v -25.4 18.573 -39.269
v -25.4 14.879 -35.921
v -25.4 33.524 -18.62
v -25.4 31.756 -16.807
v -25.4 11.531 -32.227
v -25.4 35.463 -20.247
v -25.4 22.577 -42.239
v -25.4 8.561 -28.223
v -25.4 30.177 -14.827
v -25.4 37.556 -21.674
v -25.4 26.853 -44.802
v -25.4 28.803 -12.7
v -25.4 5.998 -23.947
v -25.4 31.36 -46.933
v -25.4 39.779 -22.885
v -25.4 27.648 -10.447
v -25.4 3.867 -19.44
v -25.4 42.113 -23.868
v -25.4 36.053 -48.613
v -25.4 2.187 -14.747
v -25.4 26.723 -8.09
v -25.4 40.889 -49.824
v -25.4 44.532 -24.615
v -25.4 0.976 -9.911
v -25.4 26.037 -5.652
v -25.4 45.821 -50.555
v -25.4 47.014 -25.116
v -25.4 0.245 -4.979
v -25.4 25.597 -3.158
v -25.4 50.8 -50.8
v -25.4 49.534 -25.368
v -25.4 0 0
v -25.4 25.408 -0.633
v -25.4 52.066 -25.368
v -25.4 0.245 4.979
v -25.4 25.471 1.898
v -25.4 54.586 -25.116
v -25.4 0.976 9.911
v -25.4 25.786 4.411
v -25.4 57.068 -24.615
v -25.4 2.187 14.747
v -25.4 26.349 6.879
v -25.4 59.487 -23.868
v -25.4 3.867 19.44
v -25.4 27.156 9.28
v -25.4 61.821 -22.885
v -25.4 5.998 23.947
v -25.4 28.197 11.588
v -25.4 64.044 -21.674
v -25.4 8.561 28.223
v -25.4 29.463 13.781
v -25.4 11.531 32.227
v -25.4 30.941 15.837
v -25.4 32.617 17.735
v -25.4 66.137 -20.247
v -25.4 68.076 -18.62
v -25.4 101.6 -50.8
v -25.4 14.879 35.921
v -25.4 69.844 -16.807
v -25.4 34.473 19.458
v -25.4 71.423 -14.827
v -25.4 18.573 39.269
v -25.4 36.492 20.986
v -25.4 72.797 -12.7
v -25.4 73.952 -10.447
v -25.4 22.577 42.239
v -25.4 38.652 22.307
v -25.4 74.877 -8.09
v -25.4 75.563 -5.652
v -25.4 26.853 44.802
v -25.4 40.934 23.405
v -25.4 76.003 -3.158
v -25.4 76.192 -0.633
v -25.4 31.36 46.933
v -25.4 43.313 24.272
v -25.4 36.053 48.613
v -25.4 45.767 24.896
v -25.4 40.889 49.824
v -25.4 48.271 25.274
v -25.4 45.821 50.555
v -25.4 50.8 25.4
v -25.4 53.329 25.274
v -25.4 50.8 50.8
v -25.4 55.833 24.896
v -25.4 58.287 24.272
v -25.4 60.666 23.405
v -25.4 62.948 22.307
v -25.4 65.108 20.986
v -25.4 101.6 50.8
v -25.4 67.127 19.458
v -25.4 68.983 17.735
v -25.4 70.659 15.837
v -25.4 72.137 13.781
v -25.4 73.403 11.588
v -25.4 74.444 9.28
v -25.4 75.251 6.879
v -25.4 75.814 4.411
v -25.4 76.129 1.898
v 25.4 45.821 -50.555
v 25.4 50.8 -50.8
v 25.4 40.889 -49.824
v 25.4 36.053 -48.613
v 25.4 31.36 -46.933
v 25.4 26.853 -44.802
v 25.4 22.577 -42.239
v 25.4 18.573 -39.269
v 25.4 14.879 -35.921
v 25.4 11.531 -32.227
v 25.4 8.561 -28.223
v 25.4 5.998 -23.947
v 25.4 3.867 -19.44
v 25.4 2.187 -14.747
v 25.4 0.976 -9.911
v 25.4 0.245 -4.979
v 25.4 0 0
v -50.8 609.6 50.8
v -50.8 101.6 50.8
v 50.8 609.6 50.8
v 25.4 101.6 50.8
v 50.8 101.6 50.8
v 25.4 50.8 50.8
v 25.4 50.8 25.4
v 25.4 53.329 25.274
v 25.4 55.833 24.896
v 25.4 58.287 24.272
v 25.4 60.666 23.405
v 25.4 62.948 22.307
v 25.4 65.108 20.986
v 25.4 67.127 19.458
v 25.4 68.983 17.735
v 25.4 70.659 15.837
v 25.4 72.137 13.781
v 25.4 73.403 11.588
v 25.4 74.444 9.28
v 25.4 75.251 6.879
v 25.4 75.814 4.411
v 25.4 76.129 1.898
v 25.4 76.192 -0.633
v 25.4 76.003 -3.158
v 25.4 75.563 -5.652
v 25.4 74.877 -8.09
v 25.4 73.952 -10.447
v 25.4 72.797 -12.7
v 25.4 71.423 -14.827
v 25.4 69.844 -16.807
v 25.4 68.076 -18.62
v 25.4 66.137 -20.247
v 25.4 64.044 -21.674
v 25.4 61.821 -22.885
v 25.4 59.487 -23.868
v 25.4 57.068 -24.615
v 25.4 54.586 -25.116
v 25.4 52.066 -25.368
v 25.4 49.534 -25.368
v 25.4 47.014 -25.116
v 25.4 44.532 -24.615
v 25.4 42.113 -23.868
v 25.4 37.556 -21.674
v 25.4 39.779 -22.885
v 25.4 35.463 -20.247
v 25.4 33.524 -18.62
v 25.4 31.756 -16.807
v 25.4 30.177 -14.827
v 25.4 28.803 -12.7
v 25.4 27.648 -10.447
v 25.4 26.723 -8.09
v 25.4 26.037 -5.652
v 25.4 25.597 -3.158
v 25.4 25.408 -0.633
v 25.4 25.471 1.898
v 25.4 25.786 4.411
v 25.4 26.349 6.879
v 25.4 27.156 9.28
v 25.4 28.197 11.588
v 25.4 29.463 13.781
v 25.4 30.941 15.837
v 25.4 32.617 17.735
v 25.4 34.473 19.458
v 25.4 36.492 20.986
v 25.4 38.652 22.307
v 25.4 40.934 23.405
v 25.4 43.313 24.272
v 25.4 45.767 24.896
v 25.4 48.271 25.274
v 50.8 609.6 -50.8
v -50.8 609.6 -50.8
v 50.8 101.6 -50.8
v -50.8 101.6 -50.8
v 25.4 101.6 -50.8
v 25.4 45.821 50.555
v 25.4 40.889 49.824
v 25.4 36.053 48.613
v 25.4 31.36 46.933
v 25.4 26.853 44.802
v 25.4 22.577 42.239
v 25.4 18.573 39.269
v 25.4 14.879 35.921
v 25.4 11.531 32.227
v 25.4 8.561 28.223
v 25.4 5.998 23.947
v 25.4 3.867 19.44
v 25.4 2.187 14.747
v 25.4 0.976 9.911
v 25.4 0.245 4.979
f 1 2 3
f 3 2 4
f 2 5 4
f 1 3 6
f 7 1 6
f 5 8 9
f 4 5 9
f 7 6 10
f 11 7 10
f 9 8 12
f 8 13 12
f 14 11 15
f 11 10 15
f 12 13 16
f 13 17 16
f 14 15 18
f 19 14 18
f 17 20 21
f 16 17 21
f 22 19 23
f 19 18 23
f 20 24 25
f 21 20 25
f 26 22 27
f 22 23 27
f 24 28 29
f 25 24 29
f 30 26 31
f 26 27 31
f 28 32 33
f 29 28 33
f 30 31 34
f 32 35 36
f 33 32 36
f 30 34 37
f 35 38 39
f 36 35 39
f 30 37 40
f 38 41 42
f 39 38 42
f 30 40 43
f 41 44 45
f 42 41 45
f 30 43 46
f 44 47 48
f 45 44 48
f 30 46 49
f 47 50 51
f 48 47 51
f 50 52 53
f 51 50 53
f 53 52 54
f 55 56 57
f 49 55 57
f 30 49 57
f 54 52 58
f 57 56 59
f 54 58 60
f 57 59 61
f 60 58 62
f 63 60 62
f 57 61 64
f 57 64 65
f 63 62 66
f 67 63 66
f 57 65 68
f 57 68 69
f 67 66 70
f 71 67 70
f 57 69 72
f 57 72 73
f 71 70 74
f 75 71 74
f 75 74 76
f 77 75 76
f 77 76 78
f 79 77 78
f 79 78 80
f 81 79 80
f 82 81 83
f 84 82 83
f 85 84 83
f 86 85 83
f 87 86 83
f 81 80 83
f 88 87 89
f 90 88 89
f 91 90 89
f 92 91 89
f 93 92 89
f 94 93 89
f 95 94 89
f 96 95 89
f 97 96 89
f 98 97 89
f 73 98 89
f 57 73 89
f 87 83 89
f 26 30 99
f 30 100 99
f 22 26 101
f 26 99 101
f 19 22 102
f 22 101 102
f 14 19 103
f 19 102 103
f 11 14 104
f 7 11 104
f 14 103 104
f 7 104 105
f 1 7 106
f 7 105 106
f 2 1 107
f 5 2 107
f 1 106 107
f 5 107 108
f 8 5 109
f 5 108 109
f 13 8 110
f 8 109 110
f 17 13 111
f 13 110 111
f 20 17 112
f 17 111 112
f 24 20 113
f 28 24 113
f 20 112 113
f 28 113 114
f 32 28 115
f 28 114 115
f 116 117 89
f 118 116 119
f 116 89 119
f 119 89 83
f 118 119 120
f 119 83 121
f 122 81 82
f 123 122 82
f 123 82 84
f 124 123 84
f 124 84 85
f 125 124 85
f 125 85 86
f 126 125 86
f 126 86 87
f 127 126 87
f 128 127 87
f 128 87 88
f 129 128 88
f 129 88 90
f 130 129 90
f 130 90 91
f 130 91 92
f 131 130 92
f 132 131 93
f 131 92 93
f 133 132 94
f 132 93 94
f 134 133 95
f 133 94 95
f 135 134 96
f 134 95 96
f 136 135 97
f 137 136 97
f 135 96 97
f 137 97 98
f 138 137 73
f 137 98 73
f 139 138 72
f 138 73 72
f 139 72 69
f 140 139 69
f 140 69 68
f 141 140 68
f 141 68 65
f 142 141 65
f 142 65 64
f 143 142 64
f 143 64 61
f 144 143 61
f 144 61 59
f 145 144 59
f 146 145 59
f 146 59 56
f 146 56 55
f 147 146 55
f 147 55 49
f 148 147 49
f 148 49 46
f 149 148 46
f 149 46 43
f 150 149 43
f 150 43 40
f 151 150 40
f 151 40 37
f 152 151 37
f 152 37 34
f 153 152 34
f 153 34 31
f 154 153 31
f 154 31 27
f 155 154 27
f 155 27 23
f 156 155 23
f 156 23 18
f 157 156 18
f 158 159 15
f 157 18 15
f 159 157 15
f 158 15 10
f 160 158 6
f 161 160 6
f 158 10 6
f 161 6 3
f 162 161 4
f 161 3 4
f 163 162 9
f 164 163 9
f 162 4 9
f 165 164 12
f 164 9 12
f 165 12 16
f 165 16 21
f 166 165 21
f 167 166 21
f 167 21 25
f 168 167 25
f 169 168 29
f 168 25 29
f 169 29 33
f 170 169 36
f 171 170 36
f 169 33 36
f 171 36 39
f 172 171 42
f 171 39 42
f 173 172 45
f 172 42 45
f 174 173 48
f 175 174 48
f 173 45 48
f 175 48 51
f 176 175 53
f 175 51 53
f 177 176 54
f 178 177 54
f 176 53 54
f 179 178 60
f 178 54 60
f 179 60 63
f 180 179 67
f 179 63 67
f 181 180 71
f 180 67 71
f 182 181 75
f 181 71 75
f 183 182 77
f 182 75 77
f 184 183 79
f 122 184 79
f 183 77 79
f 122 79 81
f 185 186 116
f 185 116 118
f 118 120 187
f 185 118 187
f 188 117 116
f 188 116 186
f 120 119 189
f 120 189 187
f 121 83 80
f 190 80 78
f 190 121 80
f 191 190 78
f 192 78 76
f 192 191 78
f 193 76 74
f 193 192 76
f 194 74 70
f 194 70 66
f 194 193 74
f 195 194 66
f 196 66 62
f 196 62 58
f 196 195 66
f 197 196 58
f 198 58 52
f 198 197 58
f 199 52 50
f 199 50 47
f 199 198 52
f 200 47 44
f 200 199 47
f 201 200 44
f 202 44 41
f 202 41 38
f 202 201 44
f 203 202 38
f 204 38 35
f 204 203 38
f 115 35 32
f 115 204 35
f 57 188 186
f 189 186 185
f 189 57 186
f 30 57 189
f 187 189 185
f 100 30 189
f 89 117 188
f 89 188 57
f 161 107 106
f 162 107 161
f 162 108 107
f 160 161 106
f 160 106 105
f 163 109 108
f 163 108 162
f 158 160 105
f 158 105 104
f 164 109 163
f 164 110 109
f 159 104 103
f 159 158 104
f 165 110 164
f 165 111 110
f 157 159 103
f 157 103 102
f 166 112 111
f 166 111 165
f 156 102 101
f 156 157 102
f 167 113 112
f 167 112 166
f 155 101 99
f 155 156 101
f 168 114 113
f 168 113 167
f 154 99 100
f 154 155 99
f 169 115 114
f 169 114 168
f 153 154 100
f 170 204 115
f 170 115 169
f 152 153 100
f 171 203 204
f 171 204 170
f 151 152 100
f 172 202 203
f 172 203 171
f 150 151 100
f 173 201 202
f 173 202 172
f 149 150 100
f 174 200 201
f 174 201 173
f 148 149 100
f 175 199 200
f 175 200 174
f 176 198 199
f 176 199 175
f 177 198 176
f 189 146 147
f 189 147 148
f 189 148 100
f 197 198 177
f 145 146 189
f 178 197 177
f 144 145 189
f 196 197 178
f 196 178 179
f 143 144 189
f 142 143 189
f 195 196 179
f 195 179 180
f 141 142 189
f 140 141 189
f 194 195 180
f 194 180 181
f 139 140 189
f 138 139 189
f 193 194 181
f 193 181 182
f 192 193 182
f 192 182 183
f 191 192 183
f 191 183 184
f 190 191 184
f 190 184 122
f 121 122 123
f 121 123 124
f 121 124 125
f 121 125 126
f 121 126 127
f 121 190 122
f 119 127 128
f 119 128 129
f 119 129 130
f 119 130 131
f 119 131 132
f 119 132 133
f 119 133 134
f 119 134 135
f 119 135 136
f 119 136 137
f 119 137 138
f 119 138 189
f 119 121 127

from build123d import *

# Parameters (mm, degrees)
SKETCH1_W           = 101.6
SKETCH1_H           = 101.6
BOSS_EXTRUDE1_DEPTH = 609.6
SKETCH2_W           = 25.4
SKETCH2_H           = 101.6
CUT_EXTRUDE1_DEPTH  = 621.093025279
FILLET1_R           = 50.8
SKETCH3_R           = 25.4
CUT_EXTRUDE2_DEPTH  = 617.440783855


with BuildPart() as part:
    # Sketch1 → Boss-Extrude1 (new body)
    with BuildSketch(Plane(origin=(0, 0, 0), x_dir=(1, 0, 0), z_dir=(0, 1, 0))):
        Rectangle(SKETCH1_W, SKETCH1_H)
    extrude(amount=BOSS_EXTRUDE1_DEPTH)

    # Sketch2 → Cut-Extrude1 (cut, through all)
    with BuildSketch(Plane.XY.offset(50.8)):
        with Locations((-38.1, 50.8)):
            Rectangle(SKETCH2_W, SKETCH2_H)
        with Locations((38.1, 50.8)):
            Rectangle(SKETCH2_W, SKETCH2_H)
    extrude(amount=-CUT_EXTRUDE1_DEPTH, mode=Mode.SUBTRACT)

    # Fillet1
    fillet1_edges = [part.edges().sort_by_distance(p)[0] for p in [
        (0, 0, -50.8),
        (0, 0, 50.8),
    ]]
    fillet(fillet1_edges, radius=FILLET1_R - 0.0001)  # a hair under: the kernel refuses the full size

    # Sketch3 → Cut-Extrude2 (cut, through all)
    with BuildSketch(Plane.ZY.offset(25.4)):
        with Locations((0, 50.8)):
            Circle(SKETCH3_R)
    extrude(amount=-CUT_EXTRUDE2_DEPTH, mode=Mode.SUBTRACT)


solid = part.part
